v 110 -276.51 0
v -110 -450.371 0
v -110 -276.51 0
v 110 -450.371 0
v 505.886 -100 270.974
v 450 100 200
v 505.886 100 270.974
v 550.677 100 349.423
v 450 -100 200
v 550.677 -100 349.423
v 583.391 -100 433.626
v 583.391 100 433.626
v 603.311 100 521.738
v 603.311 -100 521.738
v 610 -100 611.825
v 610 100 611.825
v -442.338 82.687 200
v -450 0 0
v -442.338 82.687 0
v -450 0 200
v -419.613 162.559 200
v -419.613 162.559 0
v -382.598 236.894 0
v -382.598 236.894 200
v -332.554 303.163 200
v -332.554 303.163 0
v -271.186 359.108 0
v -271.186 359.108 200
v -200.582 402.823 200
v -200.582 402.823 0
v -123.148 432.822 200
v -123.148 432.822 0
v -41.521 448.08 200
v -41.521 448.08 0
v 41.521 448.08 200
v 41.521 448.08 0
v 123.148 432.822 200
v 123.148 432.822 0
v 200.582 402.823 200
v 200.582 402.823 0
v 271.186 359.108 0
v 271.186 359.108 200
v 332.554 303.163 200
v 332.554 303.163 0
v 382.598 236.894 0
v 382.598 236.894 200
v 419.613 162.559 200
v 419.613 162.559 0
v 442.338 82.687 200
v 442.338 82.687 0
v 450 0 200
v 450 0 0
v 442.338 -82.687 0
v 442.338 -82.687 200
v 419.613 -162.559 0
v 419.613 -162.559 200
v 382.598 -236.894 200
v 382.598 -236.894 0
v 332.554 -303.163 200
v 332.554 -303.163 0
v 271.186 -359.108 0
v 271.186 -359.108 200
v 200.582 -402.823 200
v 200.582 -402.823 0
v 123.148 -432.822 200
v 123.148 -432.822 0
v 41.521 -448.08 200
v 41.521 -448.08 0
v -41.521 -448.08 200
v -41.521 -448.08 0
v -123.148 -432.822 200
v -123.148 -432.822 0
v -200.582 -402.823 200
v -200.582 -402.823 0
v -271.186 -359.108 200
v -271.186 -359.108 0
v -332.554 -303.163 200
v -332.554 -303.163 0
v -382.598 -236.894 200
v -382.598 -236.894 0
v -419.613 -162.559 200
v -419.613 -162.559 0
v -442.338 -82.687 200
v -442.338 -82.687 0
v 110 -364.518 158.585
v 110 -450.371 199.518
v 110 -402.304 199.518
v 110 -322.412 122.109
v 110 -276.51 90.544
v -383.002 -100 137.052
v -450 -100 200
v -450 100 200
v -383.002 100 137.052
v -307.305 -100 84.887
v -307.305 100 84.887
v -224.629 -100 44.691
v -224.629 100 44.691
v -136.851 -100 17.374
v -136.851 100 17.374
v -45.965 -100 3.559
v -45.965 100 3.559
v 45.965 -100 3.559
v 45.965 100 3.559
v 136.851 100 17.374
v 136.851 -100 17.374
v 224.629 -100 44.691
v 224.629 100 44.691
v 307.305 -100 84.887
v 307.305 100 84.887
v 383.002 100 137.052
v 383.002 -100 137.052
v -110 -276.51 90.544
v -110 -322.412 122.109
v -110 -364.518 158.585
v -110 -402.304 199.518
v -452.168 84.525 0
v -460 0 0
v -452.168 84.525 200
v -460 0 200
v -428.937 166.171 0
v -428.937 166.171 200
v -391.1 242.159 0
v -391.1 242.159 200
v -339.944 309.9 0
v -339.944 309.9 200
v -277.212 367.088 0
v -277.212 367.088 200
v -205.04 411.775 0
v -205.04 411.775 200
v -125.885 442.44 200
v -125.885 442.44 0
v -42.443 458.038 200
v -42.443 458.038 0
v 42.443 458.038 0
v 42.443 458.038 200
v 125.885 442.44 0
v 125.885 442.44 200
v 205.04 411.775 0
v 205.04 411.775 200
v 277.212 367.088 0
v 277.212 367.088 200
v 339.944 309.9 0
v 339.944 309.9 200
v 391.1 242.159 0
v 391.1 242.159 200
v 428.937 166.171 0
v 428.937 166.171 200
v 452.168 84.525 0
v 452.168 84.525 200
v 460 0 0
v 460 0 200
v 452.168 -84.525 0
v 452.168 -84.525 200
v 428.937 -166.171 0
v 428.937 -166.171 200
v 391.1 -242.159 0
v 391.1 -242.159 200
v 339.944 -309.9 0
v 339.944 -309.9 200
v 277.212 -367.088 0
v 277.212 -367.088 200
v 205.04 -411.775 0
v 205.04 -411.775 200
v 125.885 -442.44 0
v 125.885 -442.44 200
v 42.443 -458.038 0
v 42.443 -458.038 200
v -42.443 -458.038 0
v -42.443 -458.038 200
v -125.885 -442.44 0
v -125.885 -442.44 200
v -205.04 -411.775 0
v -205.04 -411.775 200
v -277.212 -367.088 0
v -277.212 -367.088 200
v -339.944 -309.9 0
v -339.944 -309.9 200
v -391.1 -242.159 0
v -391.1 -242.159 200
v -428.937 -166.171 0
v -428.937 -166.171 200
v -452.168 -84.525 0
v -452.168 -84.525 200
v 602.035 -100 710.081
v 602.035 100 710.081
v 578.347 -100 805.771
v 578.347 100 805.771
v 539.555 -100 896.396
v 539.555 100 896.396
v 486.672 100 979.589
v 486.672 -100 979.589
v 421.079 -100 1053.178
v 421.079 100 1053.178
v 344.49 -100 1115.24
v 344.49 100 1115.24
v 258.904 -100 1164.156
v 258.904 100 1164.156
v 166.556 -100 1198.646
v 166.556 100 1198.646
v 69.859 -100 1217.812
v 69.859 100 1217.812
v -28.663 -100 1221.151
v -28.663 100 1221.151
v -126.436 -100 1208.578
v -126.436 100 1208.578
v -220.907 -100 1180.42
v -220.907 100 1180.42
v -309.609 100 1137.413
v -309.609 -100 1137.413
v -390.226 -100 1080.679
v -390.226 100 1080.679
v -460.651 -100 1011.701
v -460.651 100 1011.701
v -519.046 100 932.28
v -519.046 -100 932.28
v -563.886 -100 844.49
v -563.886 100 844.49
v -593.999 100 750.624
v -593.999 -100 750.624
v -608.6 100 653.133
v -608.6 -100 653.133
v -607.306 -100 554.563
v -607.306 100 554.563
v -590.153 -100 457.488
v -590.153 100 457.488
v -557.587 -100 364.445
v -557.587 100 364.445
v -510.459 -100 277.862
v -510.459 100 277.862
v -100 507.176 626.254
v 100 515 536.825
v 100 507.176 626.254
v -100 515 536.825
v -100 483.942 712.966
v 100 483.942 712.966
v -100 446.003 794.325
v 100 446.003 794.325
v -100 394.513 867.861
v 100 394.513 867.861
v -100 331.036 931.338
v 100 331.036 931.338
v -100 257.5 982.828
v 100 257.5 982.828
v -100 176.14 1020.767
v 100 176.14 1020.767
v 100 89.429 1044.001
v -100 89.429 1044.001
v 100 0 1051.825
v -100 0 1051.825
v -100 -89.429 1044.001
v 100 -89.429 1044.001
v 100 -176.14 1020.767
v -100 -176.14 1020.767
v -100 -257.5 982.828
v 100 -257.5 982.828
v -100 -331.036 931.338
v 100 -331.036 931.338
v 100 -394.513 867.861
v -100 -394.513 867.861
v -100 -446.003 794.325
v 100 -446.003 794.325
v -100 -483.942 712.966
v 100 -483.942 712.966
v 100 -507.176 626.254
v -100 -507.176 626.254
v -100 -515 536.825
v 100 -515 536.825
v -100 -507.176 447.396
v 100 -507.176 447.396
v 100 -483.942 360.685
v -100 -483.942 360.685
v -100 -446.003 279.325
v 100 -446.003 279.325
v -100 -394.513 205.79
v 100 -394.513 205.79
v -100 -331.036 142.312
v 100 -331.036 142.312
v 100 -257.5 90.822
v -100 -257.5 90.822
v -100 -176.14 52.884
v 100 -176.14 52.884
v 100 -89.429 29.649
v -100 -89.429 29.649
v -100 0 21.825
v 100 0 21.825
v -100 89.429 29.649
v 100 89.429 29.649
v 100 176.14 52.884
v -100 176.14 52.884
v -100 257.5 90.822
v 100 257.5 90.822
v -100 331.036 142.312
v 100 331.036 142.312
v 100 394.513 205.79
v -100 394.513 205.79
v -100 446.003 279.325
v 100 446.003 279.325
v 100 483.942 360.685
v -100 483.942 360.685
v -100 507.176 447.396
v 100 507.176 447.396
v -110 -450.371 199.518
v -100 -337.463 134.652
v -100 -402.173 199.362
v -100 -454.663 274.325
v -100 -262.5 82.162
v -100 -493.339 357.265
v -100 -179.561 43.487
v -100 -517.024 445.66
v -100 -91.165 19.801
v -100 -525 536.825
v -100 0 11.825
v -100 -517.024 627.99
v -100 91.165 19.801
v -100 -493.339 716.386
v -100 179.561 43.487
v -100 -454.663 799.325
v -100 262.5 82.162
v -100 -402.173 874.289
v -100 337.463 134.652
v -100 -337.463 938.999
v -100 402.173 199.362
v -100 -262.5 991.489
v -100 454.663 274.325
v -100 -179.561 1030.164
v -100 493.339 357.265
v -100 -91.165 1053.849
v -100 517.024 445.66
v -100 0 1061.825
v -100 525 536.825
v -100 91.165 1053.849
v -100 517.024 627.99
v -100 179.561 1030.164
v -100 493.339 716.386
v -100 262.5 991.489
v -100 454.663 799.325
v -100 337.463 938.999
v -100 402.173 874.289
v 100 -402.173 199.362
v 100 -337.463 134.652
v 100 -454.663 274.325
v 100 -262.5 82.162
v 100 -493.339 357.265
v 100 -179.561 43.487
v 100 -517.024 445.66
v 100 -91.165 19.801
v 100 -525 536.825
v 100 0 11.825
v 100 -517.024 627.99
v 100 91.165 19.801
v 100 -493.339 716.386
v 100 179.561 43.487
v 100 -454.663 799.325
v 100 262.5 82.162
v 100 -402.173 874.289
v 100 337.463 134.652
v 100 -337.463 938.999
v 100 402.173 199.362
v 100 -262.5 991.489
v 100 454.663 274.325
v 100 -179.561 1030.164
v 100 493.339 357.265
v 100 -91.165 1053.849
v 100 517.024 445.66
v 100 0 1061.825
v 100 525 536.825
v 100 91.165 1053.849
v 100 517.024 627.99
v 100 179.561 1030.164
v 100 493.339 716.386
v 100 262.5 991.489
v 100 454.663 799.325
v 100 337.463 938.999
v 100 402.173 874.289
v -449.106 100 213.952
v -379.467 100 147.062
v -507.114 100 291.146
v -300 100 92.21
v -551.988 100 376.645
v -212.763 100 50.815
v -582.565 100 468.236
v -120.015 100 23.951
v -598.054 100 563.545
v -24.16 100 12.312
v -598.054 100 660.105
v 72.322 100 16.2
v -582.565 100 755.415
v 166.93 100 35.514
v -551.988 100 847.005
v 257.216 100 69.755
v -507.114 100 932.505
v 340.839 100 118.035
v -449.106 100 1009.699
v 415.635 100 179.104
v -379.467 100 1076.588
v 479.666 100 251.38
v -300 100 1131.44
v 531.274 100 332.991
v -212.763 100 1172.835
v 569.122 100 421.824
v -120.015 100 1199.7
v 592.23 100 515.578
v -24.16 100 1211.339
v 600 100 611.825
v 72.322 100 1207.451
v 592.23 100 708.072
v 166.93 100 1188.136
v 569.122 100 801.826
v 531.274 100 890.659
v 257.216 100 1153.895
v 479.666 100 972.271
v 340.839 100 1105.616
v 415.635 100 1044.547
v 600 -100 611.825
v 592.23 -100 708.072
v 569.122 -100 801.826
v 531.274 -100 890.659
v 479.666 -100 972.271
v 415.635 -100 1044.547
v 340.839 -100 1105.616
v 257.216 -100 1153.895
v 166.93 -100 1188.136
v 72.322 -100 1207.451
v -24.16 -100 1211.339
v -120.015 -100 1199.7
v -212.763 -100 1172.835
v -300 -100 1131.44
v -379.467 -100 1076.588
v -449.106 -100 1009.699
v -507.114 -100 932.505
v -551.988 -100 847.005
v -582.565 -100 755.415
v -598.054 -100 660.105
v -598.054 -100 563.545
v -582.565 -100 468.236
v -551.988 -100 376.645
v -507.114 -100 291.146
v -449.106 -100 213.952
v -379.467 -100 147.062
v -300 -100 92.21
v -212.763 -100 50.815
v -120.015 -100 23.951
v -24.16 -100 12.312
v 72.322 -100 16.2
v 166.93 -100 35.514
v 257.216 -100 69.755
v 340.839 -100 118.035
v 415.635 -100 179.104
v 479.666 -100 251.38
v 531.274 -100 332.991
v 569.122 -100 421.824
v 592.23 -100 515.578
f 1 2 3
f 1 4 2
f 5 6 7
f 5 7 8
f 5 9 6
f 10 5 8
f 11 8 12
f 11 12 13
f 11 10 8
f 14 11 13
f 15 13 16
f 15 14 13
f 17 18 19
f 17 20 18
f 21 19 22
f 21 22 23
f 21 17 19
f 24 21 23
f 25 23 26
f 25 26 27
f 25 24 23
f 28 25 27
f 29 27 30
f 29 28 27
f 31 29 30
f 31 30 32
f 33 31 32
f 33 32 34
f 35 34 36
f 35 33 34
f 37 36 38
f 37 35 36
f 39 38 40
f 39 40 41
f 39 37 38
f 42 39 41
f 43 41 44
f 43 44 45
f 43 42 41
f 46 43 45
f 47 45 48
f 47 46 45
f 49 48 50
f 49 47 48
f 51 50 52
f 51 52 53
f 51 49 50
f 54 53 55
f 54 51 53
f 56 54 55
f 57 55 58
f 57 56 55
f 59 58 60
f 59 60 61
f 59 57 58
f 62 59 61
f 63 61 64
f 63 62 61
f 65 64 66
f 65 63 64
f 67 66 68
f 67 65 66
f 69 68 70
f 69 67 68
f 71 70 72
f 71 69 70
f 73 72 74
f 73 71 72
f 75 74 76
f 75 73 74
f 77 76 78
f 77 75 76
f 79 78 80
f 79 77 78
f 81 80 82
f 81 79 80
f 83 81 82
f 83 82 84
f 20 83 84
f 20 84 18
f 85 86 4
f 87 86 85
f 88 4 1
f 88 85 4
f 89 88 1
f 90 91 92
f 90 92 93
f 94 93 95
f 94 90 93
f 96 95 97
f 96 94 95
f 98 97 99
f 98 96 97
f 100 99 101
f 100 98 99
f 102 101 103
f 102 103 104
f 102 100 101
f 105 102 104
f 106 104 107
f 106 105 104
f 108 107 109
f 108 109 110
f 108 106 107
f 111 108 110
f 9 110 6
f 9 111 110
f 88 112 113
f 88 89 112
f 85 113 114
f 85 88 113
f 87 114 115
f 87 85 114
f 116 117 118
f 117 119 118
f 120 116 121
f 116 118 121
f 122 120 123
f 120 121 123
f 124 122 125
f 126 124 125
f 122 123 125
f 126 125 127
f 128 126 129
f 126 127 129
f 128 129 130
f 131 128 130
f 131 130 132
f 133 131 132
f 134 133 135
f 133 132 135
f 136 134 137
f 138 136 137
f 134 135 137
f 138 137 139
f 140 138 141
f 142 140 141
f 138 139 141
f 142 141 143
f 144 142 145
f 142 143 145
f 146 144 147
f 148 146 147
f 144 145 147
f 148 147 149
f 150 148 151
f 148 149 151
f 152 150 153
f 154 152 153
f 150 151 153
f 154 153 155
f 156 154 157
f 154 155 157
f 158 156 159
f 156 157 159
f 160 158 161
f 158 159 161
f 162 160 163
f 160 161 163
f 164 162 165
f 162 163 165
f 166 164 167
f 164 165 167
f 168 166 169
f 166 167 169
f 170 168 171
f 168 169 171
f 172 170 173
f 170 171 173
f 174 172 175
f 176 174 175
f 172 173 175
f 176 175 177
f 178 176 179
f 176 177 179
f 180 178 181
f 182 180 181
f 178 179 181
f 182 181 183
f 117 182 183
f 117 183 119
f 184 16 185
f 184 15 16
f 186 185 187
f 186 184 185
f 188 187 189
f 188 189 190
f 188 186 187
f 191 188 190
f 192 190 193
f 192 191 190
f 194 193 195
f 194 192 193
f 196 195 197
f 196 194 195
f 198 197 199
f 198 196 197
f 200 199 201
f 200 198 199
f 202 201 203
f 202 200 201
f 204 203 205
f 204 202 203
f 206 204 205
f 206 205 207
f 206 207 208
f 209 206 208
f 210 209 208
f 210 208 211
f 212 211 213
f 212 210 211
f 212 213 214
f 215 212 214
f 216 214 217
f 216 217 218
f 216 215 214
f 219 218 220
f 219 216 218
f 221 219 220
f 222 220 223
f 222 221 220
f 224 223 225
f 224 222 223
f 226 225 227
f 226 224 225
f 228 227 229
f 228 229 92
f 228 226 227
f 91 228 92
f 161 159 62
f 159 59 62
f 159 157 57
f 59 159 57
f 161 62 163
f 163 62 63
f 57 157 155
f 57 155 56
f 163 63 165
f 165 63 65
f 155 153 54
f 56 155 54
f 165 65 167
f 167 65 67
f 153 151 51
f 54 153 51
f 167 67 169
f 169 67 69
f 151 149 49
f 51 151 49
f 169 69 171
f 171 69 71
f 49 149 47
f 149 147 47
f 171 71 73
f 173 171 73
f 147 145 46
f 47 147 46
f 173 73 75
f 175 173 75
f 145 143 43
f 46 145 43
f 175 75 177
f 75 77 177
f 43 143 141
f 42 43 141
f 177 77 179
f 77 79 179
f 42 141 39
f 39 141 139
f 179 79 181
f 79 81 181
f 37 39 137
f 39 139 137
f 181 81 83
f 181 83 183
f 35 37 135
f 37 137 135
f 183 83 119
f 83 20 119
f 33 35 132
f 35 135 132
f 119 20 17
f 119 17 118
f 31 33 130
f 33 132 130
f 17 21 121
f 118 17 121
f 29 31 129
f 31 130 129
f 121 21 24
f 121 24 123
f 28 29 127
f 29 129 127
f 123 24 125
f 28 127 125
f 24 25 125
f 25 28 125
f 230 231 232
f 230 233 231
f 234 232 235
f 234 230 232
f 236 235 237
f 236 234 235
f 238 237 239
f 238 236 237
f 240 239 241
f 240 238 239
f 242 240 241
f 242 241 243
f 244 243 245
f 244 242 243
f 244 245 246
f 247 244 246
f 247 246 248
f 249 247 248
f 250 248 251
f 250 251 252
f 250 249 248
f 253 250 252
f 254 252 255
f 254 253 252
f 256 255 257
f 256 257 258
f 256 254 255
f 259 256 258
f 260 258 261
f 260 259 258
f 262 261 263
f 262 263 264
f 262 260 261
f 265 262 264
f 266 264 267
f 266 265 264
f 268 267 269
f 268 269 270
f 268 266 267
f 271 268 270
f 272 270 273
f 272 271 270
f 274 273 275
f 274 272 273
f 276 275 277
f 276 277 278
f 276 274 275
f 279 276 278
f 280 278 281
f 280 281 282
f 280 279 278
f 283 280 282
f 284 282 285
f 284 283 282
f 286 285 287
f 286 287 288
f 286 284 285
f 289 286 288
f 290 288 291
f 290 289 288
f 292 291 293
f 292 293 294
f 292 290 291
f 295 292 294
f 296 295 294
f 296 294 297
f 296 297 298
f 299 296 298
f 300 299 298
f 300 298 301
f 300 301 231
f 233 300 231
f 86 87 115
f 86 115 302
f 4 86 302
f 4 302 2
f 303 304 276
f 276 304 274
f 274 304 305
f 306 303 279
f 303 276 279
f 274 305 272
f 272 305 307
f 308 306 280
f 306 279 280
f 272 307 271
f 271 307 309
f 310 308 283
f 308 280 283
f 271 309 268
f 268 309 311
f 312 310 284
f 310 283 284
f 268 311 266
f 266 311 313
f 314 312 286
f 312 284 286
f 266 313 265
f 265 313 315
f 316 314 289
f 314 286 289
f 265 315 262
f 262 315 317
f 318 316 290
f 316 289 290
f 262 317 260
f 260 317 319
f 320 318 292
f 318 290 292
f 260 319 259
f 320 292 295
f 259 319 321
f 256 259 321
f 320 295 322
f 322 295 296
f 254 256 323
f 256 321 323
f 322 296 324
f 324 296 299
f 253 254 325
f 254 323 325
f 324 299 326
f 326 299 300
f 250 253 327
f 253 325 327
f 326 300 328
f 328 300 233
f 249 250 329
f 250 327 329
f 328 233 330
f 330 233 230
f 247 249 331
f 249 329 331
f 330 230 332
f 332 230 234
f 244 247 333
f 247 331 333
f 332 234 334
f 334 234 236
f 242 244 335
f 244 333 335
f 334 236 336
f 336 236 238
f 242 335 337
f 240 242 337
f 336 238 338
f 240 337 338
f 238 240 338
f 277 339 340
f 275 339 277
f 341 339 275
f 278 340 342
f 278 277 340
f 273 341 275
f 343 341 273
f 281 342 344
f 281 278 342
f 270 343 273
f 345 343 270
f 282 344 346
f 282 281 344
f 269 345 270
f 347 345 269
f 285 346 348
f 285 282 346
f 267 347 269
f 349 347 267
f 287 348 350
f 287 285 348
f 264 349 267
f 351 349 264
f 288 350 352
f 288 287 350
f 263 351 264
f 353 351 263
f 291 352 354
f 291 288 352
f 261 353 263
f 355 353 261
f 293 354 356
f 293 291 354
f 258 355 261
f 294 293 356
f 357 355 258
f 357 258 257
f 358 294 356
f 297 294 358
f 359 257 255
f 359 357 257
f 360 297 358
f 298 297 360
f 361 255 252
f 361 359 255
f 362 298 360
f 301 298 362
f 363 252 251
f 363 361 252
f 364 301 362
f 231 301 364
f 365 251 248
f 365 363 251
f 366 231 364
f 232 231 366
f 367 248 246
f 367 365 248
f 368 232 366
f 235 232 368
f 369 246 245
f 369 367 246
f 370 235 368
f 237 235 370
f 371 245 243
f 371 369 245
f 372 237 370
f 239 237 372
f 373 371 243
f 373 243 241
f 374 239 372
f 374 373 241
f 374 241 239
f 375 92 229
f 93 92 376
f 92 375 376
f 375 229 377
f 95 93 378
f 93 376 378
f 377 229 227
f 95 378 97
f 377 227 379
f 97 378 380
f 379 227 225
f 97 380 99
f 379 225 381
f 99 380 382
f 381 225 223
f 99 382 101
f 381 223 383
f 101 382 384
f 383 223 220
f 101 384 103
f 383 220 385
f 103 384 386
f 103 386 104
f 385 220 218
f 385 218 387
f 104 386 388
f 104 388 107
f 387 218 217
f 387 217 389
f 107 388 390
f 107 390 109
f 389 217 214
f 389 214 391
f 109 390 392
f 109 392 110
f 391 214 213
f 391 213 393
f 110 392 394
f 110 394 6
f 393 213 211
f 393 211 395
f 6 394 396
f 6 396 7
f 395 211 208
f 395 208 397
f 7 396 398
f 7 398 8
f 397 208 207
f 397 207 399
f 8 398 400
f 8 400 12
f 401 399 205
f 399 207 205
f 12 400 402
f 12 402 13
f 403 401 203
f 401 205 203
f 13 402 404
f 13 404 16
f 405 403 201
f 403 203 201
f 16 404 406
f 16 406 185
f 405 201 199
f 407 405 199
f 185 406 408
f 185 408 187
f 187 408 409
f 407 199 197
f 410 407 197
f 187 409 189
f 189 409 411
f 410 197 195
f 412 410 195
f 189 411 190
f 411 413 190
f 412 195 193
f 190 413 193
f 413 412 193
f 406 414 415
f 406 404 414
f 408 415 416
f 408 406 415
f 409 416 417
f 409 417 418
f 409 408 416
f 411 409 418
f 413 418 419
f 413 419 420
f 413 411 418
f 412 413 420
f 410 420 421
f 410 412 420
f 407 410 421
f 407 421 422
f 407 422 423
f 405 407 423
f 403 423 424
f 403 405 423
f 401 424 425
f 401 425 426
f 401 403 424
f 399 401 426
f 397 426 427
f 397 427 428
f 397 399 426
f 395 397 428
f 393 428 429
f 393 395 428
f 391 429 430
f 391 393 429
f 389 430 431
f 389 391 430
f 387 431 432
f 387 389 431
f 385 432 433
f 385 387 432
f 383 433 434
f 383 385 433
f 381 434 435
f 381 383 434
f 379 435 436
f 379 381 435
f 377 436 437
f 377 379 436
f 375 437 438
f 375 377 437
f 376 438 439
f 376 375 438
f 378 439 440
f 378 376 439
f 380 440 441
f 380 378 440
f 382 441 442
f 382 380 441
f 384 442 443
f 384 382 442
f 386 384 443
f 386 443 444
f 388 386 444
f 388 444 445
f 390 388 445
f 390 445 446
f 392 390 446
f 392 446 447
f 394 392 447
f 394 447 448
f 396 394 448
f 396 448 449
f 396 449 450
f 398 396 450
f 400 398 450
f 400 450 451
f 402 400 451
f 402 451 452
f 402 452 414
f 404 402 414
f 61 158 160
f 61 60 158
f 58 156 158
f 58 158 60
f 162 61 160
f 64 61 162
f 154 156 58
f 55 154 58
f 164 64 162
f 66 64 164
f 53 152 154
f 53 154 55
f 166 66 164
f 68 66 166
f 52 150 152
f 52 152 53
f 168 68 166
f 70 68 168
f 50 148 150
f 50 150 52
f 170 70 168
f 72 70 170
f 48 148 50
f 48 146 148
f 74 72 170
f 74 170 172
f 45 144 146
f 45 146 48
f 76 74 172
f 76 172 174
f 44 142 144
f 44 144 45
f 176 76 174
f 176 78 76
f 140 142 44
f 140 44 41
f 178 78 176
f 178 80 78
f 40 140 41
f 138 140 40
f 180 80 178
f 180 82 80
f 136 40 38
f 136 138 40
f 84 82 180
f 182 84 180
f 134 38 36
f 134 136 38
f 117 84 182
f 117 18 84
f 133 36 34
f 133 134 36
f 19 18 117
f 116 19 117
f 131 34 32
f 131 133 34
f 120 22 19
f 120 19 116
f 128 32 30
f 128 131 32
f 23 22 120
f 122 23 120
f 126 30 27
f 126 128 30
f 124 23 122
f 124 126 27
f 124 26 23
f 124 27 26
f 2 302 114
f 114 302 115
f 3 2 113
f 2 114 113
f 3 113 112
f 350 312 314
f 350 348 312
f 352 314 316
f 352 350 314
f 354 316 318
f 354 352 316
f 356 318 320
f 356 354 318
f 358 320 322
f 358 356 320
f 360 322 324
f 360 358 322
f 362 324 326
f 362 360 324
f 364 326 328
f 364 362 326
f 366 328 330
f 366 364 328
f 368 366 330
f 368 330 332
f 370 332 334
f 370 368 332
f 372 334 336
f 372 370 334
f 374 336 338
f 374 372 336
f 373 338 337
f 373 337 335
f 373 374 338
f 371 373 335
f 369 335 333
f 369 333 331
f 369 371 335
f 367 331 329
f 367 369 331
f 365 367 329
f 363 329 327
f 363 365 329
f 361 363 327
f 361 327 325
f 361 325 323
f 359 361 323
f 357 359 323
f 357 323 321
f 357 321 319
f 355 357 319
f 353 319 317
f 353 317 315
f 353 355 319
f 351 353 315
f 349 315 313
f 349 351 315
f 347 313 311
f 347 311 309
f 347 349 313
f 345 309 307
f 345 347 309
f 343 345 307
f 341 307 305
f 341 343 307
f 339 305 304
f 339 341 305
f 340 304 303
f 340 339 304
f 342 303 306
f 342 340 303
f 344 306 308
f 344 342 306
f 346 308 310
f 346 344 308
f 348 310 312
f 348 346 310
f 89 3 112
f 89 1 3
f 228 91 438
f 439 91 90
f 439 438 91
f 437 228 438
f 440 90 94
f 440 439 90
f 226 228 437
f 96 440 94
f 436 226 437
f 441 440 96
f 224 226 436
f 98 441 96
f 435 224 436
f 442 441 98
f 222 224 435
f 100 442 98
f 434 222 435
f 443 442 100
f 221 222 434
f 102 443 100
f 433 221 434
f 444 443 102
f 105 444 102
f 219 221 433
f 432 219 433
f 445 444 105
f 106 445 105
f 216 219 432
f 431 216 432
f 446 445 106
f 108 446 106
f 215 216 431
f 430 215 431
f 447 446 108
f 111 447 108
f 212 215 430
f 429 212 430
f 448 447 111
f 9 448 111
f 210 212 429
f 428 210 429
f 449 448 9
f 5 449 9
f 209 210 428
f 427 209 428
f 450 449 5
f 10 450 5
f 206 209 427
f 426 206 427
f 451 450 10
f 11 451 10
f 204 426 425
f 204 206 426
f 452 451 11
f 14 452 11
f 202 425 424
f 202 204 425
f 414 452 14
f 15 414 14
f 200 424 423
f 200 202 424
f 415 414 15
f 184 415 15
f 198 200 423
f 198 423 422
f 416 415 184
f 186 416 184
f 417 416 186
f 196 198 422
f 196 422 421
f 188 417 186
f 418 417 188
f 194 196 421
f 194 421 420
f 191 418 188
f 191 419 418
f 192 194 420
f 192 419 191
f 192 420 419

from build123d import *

# Parameters (mm, degrees)
F0_R     = 600
F1_DEPTH = 100
F0_W     = 10
F0_H     = 200
F4_R     = 515
F5_DEPTH = 100
F7_DEPTH = 110


with BuildPart() as f1:
    # F0 (on Front) → F1 (new body, symmetric)
    with BuildSketch(Plane.XZ):
        with BuildLine():
            ThreePointArc((610, 611.825206), (-220.90722, 1180.419965), (-450, 200))
            ThreePointArc((-450, 200), (0, 1.825206), (450, 200))
            ThreePointArc((450, 200), (568.594759, 390.917985), (610, 611.825206))
        make_face()
        with Locations((0, 611.825206)):
            Circle(F0_R, mode=Mode.SUBTRACT)
    extrude(amount=F1_DEPTH, both=True)


with BuildPart() as f3:
    # F0 (on Front) → F3 (revolve)
    with BuildSketch(Plane.XZ):
        with Locations((-455, 100)):
            Rectangle(F0_W, F0_H)
    revolve(axis=Axis((0, 0, 82.918629), (0, 0, -1)))


with BuildPart() as f5:
    # F4 (on Right) → F5 (new body, symmetric)
    with BuildSketch(Plane.YZ):
        with BuildLine():
            ThreePointArc((2e-06, 11.825206), (371.231061, 165.594146), (525, 536.825206))
            ThreePointArc((525, 536.825206), (-371.231061, 908.056265), (2e-06, 11.825206))
        make_face()
        with Locations((0, 536.825206)):
            Circle(F4_R, mode=Mode.SUBTRACT)
    extrude(amount=F5_DEPTH, both=True)


with BuildPart() as f7:
    # F6 (on Right) → F7 (new body, symmetric)
    with BuildSketch(Plane.YZ):
        with BuildLine():
            ThreePointArc((-276.510298, 90.543843), (-343.973234, 139.759997), (-402.304157, 199.517682))
            Line((-402.304157, 199.517682), (-450.37058, 199.517682))
            Line((-450.37058, 199.517682), (-450.37058, 0))
            Line((-450.37058, 0), (-276.510298, 0))
            Line((-276.510298, 0), (-276.510298, 90.543843))
        make_face()
    extrude(amount=F7_DEPTH, both=True)


solid = Compound([f1.part, f3.part, f5.part, f7.part])
